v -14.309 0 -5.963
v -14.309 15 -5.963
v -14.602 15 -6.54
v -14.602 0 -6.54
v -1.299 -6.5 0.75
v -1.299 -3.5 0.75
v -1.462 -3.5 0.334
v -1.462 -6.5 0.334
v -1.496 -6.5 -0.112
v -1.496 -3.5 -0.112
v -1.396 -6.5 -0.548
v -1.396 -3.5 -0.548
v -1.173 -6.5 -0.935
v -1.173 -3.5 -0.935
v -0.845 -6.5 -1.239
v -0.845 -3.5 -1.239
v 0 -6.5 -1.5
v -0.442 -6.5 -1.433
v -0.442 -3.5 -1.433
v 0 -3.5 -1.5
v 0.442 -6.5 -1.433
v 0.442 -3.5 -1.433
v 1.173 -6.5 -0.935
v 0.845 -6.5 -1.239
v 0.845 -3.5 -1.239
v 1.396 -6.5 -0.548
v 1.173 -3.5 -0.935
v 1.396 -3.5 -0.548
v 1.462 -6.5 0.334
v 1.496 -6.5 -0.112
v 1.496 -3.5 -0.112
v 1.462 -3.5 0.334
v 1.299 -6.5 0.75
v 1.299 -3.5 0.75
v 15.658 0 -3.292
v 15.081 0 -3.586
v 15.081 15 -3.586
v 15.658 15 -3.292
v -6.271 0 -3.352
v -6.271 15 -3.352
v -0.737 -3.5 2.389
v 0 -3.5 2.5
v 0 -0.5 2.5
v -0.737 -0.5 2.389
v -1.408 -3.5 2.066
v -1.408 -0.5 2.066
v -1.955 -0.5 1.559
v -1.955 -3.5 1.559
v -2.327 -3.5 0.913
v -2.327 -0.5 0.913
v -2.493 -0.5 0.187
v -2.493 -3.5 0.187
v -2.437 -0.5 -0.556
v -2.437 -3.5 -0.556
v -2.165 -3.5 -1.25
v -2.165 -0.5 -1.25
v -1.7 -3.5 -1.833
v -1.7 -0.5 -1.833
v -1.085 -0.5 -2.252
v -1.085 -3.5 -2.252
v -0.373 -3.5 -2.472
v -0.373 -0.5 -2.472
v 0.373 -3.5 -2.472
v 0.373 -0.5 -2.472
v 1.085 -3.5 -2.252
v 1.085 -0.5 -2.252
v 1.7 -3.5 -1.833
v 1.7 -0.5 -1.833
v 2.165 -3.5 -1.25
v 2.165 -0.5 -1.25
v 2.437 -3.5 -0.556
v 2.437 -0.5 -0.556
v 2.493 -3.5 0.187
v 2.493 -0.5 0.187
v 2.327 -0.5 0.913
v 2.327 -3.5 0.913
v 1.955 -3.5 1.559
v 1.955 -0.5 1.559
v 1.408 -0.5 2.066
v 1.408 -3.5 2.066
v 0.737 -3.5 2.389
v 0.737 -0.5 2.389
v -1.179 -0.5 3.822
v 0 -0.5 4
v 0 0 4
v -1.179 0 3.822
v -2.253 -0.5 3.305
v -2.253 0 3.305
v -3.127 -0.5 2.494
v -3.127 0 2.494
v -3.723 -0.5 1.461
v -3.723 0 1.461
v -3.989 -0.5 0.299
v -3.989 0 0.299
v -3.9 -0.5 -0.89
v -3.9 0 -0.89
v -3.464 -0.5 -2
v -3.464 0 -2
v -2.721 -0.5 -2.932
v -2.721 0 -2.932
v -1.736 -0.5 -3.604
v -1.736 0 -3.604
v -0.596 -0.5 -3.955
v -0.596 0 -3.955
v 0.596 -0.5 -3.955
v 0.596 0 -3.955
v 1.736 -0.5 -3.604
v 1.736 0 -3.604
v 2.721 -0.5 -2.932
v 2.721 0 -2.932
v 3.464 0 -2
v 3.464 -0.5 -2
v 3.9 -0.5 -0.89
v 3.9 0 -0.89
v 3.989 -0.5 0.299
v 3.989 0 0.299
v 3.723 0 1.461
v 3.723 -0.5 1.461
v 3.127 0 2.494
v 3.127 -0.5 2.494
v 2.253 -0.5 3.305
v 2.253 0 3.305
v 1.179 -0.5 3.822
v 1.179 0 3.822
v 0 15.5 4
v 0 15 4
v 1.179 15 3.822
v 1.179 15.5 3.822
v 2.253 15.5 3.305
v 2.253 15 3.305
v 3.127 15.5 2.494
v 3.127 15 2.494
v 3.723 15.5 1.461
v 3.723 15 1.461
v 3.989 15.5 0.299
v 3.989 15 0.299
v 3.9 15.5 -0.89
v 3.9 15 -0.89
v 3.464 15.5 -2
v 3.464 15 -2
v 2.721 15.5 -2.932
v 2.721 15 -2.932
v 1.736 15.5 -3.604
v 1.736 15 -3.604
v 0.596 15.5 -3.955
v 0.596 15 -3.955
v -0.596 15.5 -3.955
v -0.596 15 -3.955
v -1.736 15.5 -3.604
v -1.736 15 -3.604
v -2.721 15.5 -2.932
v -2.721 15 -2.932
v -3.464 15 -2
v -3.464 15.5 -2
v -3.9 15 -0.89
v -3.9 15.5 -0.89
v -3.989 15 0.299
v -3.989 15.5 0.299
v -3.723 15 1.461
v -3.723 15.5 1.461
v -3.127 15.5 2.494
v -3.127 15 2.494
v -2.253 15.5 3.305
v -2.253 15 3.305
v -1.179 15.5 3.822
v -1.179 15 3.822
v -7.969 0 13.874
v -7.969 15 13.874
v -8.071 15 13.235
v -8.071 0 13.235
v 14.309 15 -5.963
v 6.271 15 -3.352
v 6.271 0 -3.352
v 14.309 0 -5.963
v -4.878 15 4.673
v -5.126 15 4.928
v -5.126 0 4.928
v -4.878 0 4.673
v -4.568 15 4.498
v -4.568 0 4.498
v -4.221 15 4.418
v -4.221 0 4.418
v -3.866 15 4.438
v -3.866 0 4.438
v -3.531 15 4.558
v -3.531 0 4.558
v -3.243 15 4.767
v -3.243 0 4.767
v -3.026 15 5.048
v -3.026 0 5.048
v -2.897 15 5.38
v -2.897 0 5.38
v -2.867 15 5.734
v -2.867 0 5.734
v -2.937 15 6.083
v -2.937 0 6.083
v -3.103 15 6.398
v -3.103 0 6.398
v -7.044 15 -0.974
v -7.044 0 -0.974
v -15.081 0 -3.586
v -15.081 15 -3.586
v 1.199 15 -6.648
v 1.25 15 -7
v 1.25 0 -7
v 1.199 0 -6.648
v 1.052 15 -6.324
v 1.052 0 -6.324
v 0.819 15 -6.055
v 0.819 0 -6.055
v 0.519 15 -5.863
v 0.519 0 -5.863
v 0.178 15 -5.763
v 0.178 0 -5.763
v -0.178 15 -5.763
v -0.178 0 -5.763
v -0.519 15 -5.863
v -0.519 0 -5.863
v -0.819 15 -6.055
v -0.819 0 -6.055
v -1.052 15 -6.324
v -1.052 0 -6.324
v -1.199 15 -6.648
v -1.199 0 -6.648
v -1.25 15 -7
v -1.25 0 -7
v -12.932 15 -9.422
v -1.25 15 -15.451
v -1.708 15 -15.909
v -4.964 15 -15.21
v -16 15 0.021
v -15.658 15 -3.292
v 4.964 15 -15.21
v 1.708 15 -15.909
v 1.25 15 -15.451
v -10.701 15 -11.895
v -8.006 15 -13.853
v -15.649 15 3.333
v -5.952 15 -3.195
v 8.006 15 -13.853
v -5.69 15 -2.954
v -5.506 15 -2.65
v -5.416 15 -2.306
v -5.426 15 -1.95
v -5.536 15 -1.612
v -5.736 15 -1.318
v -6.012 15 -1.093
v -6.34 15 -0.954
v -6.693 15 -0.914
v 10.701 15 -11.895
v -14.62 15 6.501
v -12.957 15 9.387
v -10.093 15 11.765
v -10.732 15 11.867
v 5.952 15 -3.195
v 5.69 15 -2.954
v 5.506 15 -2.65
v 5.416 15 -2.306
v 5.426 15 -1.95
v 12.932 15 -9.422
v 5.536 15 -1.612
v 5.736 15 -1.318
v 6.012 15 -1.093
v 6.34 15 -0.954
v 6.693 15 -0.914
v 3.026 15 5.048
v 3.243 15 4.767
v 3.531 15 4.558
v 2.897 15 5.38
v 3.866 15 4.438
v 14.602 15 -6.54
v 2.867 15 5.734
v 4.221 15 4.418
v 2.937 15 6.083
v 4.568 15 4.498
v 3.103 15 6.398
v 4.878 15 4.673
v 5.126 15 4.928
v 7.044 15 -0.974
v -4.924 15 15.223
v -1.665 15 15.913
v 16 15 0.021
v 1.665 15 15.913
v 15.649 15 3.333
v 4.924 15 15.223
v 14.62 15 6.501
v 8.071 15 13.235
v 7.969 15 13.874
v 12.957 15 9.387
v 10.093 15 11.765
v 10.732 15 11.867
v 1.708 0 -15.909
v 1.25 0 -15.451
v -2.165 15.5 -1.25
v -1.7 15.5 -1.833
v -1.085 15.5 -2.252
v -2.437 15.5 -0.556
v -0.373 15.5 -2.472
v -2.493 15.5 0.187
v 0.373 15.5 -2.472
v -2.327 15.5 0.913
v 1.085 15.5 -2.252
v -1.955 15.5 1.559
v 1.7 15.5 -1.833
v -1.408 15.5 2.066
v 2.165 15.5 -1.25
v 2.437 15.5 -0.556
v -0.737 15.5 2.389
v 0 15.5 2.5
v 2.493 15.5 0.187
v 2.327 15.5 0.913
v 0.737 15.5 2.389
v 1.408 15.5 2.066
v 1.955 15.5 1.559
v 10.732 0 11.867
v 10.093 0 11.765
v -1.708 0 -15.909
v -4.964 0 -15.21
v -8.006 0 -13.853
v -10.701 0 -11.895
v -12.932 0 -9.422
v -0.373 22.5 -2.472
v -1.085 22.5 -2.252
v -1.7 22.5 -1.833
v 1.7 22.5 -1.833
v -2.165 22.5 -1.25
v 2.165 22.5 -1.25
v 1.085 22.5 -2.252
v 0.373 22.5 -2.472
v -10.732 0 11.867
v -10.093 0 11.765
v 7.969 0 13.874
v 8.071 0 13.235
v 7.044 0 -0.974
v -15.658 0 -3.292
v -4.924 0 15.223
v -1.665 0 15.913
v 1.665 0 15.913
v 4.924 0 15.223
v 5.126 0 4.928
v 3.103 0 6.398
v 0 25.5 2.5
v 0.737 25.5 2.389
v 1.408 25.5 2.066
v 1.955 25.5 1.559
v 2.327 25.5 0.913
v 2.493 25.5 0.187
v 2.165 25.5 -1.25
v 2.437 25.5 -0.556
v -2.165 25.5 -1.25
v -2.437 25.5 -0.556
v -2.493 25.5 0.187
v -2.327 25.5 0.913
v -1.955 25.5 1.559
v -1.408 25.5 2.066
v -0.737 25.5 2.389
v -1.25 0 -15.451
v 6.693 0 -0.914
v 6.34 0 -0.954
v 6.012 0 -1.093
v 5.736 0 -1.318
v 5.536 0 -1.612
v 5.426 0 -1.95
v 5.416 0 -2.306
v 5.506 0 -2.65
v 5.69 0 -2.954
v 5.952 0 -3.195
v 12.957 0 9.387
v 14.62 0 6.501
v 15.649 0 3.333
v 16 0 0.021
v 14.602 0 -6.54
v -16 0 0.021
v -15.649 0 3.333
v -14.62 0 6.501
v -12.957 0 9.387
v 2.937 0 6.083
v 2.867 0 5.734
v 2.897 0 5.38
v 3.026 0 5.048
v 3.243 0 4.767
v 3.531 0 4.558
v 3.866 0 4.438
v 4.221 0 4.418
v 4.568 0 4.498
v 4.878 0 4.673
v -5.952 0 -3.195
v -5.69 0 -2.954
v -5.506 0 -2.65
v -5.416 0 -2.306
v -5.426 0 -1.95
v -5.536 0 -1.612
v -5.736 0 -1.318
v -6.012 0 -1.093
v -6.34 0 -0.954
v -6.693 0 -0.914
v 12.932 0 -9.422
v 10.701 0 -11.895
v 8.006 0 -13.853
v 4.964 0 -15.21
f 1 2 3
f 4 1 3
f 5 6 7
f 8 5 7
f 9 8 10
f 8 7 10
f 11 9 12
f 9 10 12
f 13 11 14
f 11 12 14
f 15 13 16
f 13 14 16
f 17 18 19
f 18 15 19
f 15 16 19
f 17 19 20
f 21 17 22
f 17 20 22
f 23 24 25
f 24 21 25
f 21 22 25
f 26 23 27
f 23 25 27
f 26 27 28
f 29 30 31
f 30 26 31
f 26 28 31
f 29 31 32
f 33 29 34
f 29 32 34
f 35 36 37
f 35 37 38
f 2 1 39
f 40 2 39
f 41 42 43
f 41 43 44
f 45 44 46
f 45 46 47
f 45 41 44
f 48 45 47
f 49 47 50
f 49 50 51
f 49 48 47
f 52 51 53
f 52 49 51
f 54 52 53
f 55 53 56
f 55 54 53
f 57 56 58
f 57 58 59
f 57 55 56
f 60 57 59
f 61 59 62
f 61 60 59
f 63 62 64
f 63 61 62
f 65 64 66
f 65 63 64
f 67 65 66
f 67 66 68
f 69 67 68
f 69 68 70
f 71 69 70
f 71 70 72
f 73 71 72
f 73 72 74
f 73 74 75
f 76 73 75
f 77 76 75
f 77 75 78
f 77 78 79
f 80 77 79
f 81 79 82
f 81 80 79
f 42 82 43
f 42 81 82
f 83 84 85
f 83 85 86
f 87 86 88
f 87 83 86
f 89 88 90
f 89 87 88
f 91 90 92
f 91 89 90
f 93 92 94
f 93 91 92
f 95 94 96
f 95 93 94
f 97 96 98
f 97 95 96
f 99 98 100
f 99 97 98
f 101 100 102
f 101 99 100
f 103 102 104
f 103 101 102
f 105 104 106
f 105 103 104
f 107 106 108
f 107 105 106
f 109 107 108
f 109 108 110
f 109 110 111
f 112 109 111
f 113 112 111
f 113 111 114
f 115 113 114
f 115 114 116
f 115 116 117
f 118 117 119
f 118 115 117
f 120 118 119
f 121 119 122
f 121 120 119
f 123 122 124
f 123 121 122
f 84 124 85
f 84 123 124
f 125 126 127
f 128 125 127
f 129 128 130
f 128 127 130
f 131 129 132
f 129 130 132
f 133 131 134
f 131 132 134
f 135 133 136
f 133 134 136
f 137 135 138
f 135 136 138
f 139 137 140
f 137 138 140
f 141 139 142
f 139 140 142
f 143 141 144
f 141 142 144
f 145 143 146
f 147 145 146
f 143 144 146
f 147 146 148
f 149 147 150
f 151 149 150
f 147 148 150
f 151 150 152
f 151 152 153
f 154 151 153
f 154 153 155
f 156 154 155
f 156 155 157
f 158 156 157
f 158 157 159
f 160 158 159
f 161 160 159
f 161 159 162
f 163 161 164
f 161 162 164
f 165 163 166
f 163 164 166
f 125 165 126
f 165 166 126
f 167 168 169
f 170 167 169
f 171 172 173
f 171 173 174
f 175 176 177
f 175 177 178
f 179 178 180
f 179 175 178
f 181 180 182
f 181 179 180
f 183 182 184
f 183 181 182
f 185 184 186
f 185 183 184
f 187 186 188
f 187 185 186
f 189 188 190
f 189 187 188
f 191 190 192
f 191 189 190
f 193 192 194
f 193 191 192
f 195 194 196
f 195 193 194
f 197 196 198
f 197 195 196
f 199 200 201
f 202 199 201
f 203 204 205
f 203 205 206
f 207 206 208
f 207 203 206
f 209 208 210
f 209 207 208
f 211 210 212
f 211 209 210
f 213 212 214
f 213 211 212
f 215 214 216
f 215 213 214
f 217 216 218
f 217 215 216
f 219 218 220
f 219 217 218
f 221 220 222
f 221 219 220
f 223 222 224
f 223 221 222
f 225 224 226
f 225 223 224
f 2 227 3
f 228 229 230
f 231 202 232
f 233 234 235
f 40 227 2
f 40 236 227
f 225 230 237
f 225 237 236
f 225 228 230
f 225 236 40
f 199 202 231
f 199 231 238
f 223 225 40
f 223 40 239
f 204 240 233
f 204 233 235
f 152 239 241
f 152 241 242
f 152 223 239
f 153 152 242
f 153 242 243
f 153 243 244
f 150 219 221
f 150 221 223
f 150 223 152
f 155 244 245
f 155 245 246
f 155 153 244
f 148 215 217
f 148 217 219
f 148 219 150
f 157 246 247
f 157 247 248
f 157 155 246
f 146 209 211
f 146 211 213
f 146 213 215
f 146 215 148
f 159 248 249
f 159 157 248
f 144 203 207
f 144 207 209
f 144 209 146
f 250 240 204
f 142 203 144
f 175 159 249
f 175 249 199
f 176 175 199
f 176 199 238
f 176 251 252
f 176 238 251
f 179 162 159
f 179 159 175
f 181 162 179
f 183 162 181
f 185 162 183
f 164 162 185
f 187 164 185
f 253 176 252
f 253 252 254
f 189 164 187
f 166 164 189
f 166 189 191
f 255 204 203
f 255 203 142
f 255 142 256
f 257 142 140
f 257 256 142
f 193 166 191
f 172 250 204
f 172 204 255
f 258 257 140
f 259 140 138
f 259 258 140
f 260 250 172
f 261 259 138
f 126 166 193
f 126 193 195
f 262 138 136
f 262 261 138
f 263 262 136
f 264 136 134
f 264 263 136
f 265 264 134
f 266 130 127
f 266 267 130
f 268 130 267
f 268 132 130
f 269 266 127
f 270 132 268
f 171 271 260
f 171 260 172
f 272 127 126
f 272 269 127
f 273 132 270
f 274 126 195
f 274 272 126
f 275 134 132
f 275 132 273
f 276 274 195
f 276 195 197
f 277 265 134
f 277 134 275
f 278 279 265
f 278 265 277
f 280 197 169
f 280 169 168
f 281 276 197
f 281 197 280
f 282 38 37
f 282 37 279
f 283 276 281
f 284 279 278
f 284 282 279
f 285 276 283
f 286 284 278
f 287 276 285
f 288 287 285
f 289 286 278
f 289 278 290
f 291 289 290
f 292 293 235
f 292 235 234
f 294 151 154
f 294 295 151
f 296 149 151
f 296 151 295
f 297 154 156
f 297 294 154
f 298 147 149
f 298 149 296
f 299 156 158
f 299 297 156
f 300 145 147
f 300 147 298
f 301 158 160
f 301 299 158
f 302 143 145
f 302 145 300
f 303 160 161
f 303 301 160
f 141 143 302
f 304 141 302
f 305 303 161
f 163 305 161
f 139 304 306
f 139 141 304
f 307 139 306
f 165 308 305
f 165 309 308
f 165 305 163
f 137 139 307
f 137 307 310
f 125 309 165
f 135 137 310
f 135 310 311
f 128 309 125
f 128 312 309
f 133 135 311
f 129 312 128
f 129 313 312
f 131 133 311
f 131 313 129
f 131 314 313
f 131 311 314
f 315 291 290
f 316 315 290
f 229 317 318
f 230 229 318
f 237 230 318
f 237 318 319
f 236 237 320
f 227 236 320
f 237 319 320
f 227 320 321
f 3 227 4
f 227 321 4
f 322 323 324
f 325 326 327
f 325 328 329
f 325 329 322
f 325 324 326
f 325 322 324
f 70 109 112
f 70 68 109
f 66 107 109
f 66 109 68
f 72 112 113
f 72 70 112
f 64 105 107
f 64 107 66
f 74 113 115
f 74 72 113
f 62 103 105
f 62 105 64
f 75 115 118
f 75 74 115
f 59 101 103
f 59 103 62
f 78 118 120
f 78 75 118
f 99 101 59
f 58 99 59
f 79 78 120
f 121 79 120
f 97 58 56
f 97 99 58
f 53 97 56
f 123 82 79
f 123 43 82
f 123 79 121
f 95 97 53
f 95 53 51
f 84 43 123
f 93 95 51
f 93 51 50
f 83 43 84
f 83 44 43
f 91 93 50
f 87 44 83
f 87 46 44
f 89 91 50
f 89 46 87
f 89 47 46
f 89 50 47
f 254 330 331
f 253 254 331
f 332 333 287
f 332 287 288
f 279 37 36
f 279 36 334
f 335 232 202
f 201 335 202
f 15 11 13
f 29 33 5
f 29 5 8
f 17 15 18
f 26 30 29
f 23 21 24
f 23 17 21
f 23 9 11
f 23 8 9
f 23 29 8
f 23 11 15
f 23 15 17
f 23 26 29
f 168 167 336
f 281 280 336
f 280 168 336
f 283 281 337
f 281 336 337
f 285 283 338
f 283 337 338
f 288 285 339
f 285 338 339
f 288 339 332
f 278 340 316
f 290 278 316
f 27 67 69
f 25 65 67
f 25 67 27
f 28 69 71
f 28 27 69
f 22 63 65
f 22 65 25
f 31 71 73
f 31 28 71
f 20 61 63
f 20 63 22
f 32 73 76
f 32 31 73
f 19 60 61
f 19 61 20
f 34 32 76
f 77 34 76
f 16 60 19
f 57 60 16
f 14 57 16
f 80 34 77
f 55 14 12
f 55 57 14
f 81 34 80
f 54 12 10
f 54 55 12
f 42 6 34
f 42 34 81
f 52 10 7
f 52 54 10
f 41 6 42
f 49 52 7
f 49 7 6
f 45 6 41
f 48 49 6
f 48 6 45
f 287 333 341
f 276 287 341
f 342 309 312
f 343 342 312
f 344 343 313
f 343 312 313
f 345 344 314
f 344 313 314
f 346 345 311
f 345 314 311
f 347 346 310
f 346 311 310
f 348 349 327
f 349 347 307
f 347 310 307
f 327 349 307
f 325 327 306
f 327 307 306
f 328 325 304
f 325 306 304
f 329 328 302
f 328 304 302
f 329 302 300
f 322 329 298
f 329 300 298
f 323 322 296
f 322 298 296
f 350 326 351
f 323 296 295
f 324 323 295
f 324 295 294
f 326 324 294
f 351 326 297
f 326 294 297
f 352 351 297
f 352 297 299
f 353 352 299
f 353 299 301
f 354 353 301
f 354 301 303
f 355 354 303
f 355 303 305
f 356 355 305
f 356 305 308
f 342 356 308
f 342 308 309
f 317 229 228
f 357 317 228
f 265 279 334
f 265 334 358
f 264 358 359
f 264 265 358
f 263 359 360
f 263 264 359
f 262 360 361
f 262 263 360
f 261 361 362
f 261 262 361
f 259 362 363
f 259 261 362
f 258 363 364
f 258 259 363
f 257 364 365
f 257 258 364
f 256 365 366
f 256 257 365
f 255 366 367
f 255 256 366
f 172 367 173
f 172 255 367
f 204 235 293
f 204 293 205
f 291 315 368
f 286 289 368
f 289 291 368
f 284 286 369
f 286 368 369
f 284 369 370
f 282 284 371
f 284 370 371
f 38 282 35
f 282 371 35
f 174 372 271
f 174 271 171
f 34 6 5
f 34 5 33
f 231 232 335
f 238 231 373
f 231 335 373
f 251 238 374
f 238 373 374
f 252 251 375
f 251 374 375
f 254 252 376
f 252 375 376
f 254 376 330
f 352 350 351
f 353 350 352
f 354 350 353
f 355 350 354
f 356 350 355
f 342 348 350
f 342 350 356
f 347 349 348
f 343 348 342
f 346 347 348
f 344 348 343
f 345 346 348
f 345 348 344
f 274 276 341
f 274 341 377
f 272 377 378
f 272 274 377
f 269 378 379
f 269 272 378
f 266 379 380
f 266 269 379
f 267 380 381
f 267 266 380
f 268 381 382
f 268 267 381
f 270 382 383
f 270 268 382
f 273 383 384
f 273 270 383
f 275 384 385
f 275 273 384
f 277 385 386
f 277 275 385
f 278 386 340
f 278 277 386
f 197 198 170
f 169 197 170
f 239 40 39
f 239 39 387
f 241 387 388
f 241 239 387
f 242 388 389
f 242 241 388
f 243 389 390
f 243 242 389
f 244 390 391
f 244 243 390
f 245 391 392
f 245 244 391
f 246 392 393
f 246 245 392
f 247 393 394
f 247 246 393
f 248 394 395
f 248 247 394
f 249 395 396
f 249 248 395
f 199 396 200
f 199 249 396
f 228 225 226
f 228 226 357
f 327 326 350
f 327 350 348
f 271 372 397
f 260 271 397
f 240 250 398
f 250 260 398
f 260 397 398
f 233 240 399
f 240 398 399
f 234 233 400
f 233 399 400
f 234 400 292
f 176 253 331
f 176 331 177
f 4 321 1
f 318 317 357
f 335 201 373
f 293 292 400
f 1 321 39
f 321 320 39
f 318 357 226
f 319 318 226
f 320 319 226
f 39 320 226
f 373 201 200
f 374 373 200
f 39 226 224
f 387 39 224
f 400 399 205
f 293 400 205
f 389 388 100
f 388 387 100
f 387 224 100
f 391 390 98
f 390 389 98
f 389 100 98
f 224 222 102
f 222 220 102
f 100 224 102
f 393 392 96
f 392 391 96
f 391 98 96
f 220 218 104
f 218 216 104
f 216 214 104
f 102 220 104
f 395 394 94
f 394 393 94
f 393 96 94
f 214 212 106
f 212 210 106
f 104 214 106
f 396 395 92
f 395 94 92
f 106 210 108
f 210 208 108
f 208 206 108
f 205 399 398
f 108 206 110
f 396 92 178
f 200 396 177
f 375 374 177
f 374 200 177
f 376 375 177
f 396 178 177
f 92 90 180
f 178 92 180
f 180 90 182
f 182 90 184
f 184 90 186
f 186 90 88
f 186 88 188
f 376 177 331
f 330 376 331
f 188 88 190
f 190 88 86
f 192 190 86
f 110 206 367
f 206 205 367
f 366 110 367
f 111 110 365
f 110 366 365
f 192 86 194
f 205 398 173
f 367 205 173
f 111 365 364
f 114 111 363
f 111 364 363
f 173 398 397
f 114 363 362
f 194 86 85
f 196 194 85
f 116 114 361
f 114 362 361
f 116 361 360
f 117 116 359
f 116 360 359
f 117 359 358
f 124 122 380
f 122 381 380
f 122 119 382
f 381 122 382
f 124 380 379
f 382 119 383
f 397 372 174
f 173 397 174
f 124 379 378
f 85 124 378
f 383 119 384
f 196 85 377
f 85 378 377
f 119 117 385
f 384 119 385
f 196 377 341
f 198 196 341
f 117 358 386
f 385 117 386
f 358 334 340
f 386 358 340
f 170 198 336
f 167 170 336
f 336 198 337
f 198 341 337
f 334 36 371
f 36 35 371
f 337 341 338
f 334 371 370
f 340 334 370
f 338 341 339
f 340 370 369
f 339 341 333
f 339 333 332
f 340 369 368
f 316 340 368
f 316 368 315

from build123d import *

# Parameters (mm, degrees)
SKETCH_1_R               = 16
EXTRUDE_1_DEPTH          = 15
SKETCH_2_R               = 4
EXTRUDE_2_DEPTH          = 0.5
EXTRUDE_START            = 0.5
SKETCH_3_R               = 4
EXTRUDE_3_DEPTH          = 0.5
SKETCH_4_R               = 2.5
EXTRUDE_4_DEPTH          = 10
EXTRUDE_START_2          = 3
SKETCH_5_R               = 2.5
EXTRUDE_5_DEPTH          = 3
CUT_EXTRUDE_START        = -3
CUT_EXTRUDE_1_DEPTH      = 3
CUT_EXTRUDE_2_DEPTH      = 30.227555491
PATTERN_CIRCULAR_1_COUNT = 5
SKETCH_8_R               = 1.5
EXTRUDE_6_DEPTH          = 3
CHAMFER_1_SIZE           = 0.5
CUT_EXTRUDE_3_DEPTH      = 3


with BuildPart() as part:
    # 草图1 → 凸台-拉伸1 (new body)
    with BuildSketch(Plane(origin=(0, 0, 0), x_dir=(1, 0, 0), z_dir=(0, 1, 0))):
        with Locations(Location((0, 0, 0), (0, 0, 270))):
            Circle(SKETCH_1_R)
    extrude(amount=EXTRUDE_1_DEPTH)

    # 草图2 → 凸台-拉伸2 (add)
    with BuildSketch(Plane(origin=(0, 15, 0), x_dir=(1, 0, 0), z_dir=(0, 1, 0))):
        with Locations(Location((0, 0, 0), (0, 0, 270))):
            Circle(SKETCH_2_R)
    extrude(amount=EXTRUDE_2_DEPTH)

    # 草图3 → 凸台-拉伸3 (add)
    with BuildSketch(Plane.XZ.offset(EXTRUDE_START)):
        with Locations(Location((0, 0, 0), (0, 0, 90))):
            Circle(SKETCH_3_R)
    extrude(amount=-EXTRUDE_3_DEPTH)

    # 草图4 → 凸台-拉伸4 (add)
    with BuildSketch(Plane(origin=(0, 15.5, 0), x_dir=(1, 0, 0), z_dir=(0, 1, 0))):
        with Locations(Location((0, 0, 0), (0, 0, 270))):
            Circle(SKETCH_4_R)
    extrude(amount=EXTRUDE_4_DEPTH)

    # 草图5 → 凸台-拉伸5 (add)
    with BuildSketch(Plane.XZ.offset(0.5).offset(EXTRUDE_START_2)):
        with Locations(Location((0, 0, 0), (0, 0, 90))):
            Circle(SKETCH_5_R)
    extrude(amount=-EXTRUDE_5_DEPTH)

    # 草图6 → 切除-拉伸1 (cut)
    with BuildSketch(Plane(origin=(0, 25.5, 0), x_dir=(1, 0, 0), z_dir=(0, 1, 0)).offset(CUT_EXTRUDE_START)):
        with BuildLine():
            Line((-2.165063509, 1.25), (2.165063509, 1.25))
            ThreePointArc((2.165063509, 1.25), (0, 2.5), (-2.165063509, 1.25))
        make_face()
    extrude(amount=CUT_EXTRUDE_1_DEPTH, mode=Mode.SUBTRACT)

    # 草图7 → 切除-拉伸2 (cut, through all)
    with BuildSketch(Plane(origin=(0, 15, 0), x_dir=(1, 0, 0), z_dir=(0, 1, 0))):
        with BuildLine():
            Line((-1.25, 7), (-1.25, 19))
            Line((-1.25, 19), (1.25, 19))
            Line((1.25, 19), (1.25, 7))
            ThreePointArc((1.25, 7), (0, 5.75), (-1.25, 7))
        make_face()
    cut_extrude_2 = extrude(amount=-CUT_EXTRUDE_2_DEPTH, mode=Mode.SUBTRACT)

    # 阵列(圆周)1: 切除-拉伸2 ×5 about axis
    pattern_circular_1_axis = Axis((0, 0, 0), (0, 1, 0))
    for i in range(1, PATTERN_CIRCULAR_1_COUNT):
        add(cut_extrude_2.rotate(pattern_circular_1_axis, i * 360 / PATTERN_CIRCULAR_1_COUNT), mode=Mode.SUBTRACT)

    # 草图8 → 凸台-拉伸6 (add)
    with BuildSketch(Plane.XZ.offset(3.5)):
        with Locations(Location((0, 0, 0), (0, 0, 270))):
            Circle(SKETCH_8_R)
    extrude(amount=EXTRUDE_6_DEPTH)

    # 倒角1
    # the kernel refuses this chamfer: 0.5, 0.465086612 mm, written as the material it takes off along each edge
    with BuildSketch(Plane(origin=(-1.25, 16.285841494, -15.951097141), x_dir=(-0.9957189737161891, 0, 0.0924322745667282), z_dir=(0, -1, 0)), Plane(origin=(14.784123635, 16.285841494, -6.117980741), x_dir=(-0.3956024015425532, 0, -0.9184218746816544), z_dir=(0, -1, 0)), Plane(origin=(10.3870909, 16.285841494, 12.169977101), x_dir=(0.7512232435318049, 0, -0.6600482091313895), z_dir=(0, -1, 0)), Plane(origin=(-8.364548414, 16.285841494, 13.639440231), x_dir=(0.8598838991841529, 0, 0.5104896472249537), z_dir=(0, -1, 0)), Plane(origin=(-15.556666121, 16.285841494, -3.74033945), x_dir=(-0.21978576745721443, 0, 0.9755481620213546), z_dir=(0, -1, 0))) as chamfer_1_piece_1:
        with BuildLine():
            Line((0.459494947, 0), (CHAMFER_1_SIZE * 0.0924322745667, -CHAMFER_1_SIZE * 0.995718973716))
            Line((CHAMFER_1_SIZE * 0.0924322745667, -CHAMFER_1_SIZE * 0.995718973716), (0, 0))
            ThreePointArc((0, 0), (0.236132262, 0.001648308), (0.459494947, 0))
        make_face()
    extrude(amount=17.571682988, mode=Mode.SUBTRACT)
    with BuildSketch(Plane(origin=(1.25, 16.285841494, -15.951097141), x_dir=(0, 0, 1), z_dir=(0, -1, 0)), Plane(origin=(15.556666121, 16.285841494, -3.74033945), x_dir=(-0.9510565162951534, 0, 0.3090169943749483), z_dir=(0, -1, 0)), Plane(origin=(8.364548414, 16.285841494, 13.639440231), x_dir=(-0.587785252292472, 0, -0.8090169943749483), z_dir=(0, -1, 0)), Plane(origin=(-14.784123635, 16.285841494, -6.117980741), x_dir=(0.9510565162951535, 0, 0.3090169943749477), z_dir=(0, -1, 0))) as chamfer_1_piece_2:
        with BuildLine():
            Line((CHAMFER_1_SIZE, 0), (0.042472163, -0.457527837))
            ThreePointArc((0.042472163, -0.457527837), (0.020184991, -0.235273731), (0, 0))
            Line((0, 0), (CHAMFER_1_SIZE, 0))
        make_face()
    extrude(amount=17.571682988, mode=Mode.SUBTRACT)
    with BuildSketch(Plane(origin=(-10.3870909, 16.285841494, 12.169977101), x_dir=(-0.7512232435318061, 0, -0.6600482091313881), z_dir=(0, -1, 0))) as chamfer_1_piece_3:
        with BuildLine():
            Line((0.459494947, 0), (CHAMFER_1_SIZE * 0.0924322745667, CHAMFER_1_SIZE * 0.995718973716))
            Line((CHAMFER_1_SIZE * 0.0924322745667, CHAMFER_1_SIZE * 0.995718973716), (0, 0))
            ThreePointArc((0, 0), (0.236132262, -0.001648308), (0.459494947, 0))
        make_face()
    extrude(amount=17.571682988, mode=Mode.SUBTRACT)

    # 草图9 → 切除-拉伸3 (cut)
    with BuildSketch(Plane.XZ.offset(6.5).offset(CUT_EXTRUDE_START)):
        with BuildLine():
            Line((-1.299038106, 0.75), (1.299038106, 0.75))
            ThreePointArc((1.299038106, 0.75), (0, 1.5), (-1.299038106, 0.75))
        make_face()
    extrude(amount=CUT_EXTRUDE_3_DEPTH, mode=Mode.SUBTRACT)


solid = part.part
